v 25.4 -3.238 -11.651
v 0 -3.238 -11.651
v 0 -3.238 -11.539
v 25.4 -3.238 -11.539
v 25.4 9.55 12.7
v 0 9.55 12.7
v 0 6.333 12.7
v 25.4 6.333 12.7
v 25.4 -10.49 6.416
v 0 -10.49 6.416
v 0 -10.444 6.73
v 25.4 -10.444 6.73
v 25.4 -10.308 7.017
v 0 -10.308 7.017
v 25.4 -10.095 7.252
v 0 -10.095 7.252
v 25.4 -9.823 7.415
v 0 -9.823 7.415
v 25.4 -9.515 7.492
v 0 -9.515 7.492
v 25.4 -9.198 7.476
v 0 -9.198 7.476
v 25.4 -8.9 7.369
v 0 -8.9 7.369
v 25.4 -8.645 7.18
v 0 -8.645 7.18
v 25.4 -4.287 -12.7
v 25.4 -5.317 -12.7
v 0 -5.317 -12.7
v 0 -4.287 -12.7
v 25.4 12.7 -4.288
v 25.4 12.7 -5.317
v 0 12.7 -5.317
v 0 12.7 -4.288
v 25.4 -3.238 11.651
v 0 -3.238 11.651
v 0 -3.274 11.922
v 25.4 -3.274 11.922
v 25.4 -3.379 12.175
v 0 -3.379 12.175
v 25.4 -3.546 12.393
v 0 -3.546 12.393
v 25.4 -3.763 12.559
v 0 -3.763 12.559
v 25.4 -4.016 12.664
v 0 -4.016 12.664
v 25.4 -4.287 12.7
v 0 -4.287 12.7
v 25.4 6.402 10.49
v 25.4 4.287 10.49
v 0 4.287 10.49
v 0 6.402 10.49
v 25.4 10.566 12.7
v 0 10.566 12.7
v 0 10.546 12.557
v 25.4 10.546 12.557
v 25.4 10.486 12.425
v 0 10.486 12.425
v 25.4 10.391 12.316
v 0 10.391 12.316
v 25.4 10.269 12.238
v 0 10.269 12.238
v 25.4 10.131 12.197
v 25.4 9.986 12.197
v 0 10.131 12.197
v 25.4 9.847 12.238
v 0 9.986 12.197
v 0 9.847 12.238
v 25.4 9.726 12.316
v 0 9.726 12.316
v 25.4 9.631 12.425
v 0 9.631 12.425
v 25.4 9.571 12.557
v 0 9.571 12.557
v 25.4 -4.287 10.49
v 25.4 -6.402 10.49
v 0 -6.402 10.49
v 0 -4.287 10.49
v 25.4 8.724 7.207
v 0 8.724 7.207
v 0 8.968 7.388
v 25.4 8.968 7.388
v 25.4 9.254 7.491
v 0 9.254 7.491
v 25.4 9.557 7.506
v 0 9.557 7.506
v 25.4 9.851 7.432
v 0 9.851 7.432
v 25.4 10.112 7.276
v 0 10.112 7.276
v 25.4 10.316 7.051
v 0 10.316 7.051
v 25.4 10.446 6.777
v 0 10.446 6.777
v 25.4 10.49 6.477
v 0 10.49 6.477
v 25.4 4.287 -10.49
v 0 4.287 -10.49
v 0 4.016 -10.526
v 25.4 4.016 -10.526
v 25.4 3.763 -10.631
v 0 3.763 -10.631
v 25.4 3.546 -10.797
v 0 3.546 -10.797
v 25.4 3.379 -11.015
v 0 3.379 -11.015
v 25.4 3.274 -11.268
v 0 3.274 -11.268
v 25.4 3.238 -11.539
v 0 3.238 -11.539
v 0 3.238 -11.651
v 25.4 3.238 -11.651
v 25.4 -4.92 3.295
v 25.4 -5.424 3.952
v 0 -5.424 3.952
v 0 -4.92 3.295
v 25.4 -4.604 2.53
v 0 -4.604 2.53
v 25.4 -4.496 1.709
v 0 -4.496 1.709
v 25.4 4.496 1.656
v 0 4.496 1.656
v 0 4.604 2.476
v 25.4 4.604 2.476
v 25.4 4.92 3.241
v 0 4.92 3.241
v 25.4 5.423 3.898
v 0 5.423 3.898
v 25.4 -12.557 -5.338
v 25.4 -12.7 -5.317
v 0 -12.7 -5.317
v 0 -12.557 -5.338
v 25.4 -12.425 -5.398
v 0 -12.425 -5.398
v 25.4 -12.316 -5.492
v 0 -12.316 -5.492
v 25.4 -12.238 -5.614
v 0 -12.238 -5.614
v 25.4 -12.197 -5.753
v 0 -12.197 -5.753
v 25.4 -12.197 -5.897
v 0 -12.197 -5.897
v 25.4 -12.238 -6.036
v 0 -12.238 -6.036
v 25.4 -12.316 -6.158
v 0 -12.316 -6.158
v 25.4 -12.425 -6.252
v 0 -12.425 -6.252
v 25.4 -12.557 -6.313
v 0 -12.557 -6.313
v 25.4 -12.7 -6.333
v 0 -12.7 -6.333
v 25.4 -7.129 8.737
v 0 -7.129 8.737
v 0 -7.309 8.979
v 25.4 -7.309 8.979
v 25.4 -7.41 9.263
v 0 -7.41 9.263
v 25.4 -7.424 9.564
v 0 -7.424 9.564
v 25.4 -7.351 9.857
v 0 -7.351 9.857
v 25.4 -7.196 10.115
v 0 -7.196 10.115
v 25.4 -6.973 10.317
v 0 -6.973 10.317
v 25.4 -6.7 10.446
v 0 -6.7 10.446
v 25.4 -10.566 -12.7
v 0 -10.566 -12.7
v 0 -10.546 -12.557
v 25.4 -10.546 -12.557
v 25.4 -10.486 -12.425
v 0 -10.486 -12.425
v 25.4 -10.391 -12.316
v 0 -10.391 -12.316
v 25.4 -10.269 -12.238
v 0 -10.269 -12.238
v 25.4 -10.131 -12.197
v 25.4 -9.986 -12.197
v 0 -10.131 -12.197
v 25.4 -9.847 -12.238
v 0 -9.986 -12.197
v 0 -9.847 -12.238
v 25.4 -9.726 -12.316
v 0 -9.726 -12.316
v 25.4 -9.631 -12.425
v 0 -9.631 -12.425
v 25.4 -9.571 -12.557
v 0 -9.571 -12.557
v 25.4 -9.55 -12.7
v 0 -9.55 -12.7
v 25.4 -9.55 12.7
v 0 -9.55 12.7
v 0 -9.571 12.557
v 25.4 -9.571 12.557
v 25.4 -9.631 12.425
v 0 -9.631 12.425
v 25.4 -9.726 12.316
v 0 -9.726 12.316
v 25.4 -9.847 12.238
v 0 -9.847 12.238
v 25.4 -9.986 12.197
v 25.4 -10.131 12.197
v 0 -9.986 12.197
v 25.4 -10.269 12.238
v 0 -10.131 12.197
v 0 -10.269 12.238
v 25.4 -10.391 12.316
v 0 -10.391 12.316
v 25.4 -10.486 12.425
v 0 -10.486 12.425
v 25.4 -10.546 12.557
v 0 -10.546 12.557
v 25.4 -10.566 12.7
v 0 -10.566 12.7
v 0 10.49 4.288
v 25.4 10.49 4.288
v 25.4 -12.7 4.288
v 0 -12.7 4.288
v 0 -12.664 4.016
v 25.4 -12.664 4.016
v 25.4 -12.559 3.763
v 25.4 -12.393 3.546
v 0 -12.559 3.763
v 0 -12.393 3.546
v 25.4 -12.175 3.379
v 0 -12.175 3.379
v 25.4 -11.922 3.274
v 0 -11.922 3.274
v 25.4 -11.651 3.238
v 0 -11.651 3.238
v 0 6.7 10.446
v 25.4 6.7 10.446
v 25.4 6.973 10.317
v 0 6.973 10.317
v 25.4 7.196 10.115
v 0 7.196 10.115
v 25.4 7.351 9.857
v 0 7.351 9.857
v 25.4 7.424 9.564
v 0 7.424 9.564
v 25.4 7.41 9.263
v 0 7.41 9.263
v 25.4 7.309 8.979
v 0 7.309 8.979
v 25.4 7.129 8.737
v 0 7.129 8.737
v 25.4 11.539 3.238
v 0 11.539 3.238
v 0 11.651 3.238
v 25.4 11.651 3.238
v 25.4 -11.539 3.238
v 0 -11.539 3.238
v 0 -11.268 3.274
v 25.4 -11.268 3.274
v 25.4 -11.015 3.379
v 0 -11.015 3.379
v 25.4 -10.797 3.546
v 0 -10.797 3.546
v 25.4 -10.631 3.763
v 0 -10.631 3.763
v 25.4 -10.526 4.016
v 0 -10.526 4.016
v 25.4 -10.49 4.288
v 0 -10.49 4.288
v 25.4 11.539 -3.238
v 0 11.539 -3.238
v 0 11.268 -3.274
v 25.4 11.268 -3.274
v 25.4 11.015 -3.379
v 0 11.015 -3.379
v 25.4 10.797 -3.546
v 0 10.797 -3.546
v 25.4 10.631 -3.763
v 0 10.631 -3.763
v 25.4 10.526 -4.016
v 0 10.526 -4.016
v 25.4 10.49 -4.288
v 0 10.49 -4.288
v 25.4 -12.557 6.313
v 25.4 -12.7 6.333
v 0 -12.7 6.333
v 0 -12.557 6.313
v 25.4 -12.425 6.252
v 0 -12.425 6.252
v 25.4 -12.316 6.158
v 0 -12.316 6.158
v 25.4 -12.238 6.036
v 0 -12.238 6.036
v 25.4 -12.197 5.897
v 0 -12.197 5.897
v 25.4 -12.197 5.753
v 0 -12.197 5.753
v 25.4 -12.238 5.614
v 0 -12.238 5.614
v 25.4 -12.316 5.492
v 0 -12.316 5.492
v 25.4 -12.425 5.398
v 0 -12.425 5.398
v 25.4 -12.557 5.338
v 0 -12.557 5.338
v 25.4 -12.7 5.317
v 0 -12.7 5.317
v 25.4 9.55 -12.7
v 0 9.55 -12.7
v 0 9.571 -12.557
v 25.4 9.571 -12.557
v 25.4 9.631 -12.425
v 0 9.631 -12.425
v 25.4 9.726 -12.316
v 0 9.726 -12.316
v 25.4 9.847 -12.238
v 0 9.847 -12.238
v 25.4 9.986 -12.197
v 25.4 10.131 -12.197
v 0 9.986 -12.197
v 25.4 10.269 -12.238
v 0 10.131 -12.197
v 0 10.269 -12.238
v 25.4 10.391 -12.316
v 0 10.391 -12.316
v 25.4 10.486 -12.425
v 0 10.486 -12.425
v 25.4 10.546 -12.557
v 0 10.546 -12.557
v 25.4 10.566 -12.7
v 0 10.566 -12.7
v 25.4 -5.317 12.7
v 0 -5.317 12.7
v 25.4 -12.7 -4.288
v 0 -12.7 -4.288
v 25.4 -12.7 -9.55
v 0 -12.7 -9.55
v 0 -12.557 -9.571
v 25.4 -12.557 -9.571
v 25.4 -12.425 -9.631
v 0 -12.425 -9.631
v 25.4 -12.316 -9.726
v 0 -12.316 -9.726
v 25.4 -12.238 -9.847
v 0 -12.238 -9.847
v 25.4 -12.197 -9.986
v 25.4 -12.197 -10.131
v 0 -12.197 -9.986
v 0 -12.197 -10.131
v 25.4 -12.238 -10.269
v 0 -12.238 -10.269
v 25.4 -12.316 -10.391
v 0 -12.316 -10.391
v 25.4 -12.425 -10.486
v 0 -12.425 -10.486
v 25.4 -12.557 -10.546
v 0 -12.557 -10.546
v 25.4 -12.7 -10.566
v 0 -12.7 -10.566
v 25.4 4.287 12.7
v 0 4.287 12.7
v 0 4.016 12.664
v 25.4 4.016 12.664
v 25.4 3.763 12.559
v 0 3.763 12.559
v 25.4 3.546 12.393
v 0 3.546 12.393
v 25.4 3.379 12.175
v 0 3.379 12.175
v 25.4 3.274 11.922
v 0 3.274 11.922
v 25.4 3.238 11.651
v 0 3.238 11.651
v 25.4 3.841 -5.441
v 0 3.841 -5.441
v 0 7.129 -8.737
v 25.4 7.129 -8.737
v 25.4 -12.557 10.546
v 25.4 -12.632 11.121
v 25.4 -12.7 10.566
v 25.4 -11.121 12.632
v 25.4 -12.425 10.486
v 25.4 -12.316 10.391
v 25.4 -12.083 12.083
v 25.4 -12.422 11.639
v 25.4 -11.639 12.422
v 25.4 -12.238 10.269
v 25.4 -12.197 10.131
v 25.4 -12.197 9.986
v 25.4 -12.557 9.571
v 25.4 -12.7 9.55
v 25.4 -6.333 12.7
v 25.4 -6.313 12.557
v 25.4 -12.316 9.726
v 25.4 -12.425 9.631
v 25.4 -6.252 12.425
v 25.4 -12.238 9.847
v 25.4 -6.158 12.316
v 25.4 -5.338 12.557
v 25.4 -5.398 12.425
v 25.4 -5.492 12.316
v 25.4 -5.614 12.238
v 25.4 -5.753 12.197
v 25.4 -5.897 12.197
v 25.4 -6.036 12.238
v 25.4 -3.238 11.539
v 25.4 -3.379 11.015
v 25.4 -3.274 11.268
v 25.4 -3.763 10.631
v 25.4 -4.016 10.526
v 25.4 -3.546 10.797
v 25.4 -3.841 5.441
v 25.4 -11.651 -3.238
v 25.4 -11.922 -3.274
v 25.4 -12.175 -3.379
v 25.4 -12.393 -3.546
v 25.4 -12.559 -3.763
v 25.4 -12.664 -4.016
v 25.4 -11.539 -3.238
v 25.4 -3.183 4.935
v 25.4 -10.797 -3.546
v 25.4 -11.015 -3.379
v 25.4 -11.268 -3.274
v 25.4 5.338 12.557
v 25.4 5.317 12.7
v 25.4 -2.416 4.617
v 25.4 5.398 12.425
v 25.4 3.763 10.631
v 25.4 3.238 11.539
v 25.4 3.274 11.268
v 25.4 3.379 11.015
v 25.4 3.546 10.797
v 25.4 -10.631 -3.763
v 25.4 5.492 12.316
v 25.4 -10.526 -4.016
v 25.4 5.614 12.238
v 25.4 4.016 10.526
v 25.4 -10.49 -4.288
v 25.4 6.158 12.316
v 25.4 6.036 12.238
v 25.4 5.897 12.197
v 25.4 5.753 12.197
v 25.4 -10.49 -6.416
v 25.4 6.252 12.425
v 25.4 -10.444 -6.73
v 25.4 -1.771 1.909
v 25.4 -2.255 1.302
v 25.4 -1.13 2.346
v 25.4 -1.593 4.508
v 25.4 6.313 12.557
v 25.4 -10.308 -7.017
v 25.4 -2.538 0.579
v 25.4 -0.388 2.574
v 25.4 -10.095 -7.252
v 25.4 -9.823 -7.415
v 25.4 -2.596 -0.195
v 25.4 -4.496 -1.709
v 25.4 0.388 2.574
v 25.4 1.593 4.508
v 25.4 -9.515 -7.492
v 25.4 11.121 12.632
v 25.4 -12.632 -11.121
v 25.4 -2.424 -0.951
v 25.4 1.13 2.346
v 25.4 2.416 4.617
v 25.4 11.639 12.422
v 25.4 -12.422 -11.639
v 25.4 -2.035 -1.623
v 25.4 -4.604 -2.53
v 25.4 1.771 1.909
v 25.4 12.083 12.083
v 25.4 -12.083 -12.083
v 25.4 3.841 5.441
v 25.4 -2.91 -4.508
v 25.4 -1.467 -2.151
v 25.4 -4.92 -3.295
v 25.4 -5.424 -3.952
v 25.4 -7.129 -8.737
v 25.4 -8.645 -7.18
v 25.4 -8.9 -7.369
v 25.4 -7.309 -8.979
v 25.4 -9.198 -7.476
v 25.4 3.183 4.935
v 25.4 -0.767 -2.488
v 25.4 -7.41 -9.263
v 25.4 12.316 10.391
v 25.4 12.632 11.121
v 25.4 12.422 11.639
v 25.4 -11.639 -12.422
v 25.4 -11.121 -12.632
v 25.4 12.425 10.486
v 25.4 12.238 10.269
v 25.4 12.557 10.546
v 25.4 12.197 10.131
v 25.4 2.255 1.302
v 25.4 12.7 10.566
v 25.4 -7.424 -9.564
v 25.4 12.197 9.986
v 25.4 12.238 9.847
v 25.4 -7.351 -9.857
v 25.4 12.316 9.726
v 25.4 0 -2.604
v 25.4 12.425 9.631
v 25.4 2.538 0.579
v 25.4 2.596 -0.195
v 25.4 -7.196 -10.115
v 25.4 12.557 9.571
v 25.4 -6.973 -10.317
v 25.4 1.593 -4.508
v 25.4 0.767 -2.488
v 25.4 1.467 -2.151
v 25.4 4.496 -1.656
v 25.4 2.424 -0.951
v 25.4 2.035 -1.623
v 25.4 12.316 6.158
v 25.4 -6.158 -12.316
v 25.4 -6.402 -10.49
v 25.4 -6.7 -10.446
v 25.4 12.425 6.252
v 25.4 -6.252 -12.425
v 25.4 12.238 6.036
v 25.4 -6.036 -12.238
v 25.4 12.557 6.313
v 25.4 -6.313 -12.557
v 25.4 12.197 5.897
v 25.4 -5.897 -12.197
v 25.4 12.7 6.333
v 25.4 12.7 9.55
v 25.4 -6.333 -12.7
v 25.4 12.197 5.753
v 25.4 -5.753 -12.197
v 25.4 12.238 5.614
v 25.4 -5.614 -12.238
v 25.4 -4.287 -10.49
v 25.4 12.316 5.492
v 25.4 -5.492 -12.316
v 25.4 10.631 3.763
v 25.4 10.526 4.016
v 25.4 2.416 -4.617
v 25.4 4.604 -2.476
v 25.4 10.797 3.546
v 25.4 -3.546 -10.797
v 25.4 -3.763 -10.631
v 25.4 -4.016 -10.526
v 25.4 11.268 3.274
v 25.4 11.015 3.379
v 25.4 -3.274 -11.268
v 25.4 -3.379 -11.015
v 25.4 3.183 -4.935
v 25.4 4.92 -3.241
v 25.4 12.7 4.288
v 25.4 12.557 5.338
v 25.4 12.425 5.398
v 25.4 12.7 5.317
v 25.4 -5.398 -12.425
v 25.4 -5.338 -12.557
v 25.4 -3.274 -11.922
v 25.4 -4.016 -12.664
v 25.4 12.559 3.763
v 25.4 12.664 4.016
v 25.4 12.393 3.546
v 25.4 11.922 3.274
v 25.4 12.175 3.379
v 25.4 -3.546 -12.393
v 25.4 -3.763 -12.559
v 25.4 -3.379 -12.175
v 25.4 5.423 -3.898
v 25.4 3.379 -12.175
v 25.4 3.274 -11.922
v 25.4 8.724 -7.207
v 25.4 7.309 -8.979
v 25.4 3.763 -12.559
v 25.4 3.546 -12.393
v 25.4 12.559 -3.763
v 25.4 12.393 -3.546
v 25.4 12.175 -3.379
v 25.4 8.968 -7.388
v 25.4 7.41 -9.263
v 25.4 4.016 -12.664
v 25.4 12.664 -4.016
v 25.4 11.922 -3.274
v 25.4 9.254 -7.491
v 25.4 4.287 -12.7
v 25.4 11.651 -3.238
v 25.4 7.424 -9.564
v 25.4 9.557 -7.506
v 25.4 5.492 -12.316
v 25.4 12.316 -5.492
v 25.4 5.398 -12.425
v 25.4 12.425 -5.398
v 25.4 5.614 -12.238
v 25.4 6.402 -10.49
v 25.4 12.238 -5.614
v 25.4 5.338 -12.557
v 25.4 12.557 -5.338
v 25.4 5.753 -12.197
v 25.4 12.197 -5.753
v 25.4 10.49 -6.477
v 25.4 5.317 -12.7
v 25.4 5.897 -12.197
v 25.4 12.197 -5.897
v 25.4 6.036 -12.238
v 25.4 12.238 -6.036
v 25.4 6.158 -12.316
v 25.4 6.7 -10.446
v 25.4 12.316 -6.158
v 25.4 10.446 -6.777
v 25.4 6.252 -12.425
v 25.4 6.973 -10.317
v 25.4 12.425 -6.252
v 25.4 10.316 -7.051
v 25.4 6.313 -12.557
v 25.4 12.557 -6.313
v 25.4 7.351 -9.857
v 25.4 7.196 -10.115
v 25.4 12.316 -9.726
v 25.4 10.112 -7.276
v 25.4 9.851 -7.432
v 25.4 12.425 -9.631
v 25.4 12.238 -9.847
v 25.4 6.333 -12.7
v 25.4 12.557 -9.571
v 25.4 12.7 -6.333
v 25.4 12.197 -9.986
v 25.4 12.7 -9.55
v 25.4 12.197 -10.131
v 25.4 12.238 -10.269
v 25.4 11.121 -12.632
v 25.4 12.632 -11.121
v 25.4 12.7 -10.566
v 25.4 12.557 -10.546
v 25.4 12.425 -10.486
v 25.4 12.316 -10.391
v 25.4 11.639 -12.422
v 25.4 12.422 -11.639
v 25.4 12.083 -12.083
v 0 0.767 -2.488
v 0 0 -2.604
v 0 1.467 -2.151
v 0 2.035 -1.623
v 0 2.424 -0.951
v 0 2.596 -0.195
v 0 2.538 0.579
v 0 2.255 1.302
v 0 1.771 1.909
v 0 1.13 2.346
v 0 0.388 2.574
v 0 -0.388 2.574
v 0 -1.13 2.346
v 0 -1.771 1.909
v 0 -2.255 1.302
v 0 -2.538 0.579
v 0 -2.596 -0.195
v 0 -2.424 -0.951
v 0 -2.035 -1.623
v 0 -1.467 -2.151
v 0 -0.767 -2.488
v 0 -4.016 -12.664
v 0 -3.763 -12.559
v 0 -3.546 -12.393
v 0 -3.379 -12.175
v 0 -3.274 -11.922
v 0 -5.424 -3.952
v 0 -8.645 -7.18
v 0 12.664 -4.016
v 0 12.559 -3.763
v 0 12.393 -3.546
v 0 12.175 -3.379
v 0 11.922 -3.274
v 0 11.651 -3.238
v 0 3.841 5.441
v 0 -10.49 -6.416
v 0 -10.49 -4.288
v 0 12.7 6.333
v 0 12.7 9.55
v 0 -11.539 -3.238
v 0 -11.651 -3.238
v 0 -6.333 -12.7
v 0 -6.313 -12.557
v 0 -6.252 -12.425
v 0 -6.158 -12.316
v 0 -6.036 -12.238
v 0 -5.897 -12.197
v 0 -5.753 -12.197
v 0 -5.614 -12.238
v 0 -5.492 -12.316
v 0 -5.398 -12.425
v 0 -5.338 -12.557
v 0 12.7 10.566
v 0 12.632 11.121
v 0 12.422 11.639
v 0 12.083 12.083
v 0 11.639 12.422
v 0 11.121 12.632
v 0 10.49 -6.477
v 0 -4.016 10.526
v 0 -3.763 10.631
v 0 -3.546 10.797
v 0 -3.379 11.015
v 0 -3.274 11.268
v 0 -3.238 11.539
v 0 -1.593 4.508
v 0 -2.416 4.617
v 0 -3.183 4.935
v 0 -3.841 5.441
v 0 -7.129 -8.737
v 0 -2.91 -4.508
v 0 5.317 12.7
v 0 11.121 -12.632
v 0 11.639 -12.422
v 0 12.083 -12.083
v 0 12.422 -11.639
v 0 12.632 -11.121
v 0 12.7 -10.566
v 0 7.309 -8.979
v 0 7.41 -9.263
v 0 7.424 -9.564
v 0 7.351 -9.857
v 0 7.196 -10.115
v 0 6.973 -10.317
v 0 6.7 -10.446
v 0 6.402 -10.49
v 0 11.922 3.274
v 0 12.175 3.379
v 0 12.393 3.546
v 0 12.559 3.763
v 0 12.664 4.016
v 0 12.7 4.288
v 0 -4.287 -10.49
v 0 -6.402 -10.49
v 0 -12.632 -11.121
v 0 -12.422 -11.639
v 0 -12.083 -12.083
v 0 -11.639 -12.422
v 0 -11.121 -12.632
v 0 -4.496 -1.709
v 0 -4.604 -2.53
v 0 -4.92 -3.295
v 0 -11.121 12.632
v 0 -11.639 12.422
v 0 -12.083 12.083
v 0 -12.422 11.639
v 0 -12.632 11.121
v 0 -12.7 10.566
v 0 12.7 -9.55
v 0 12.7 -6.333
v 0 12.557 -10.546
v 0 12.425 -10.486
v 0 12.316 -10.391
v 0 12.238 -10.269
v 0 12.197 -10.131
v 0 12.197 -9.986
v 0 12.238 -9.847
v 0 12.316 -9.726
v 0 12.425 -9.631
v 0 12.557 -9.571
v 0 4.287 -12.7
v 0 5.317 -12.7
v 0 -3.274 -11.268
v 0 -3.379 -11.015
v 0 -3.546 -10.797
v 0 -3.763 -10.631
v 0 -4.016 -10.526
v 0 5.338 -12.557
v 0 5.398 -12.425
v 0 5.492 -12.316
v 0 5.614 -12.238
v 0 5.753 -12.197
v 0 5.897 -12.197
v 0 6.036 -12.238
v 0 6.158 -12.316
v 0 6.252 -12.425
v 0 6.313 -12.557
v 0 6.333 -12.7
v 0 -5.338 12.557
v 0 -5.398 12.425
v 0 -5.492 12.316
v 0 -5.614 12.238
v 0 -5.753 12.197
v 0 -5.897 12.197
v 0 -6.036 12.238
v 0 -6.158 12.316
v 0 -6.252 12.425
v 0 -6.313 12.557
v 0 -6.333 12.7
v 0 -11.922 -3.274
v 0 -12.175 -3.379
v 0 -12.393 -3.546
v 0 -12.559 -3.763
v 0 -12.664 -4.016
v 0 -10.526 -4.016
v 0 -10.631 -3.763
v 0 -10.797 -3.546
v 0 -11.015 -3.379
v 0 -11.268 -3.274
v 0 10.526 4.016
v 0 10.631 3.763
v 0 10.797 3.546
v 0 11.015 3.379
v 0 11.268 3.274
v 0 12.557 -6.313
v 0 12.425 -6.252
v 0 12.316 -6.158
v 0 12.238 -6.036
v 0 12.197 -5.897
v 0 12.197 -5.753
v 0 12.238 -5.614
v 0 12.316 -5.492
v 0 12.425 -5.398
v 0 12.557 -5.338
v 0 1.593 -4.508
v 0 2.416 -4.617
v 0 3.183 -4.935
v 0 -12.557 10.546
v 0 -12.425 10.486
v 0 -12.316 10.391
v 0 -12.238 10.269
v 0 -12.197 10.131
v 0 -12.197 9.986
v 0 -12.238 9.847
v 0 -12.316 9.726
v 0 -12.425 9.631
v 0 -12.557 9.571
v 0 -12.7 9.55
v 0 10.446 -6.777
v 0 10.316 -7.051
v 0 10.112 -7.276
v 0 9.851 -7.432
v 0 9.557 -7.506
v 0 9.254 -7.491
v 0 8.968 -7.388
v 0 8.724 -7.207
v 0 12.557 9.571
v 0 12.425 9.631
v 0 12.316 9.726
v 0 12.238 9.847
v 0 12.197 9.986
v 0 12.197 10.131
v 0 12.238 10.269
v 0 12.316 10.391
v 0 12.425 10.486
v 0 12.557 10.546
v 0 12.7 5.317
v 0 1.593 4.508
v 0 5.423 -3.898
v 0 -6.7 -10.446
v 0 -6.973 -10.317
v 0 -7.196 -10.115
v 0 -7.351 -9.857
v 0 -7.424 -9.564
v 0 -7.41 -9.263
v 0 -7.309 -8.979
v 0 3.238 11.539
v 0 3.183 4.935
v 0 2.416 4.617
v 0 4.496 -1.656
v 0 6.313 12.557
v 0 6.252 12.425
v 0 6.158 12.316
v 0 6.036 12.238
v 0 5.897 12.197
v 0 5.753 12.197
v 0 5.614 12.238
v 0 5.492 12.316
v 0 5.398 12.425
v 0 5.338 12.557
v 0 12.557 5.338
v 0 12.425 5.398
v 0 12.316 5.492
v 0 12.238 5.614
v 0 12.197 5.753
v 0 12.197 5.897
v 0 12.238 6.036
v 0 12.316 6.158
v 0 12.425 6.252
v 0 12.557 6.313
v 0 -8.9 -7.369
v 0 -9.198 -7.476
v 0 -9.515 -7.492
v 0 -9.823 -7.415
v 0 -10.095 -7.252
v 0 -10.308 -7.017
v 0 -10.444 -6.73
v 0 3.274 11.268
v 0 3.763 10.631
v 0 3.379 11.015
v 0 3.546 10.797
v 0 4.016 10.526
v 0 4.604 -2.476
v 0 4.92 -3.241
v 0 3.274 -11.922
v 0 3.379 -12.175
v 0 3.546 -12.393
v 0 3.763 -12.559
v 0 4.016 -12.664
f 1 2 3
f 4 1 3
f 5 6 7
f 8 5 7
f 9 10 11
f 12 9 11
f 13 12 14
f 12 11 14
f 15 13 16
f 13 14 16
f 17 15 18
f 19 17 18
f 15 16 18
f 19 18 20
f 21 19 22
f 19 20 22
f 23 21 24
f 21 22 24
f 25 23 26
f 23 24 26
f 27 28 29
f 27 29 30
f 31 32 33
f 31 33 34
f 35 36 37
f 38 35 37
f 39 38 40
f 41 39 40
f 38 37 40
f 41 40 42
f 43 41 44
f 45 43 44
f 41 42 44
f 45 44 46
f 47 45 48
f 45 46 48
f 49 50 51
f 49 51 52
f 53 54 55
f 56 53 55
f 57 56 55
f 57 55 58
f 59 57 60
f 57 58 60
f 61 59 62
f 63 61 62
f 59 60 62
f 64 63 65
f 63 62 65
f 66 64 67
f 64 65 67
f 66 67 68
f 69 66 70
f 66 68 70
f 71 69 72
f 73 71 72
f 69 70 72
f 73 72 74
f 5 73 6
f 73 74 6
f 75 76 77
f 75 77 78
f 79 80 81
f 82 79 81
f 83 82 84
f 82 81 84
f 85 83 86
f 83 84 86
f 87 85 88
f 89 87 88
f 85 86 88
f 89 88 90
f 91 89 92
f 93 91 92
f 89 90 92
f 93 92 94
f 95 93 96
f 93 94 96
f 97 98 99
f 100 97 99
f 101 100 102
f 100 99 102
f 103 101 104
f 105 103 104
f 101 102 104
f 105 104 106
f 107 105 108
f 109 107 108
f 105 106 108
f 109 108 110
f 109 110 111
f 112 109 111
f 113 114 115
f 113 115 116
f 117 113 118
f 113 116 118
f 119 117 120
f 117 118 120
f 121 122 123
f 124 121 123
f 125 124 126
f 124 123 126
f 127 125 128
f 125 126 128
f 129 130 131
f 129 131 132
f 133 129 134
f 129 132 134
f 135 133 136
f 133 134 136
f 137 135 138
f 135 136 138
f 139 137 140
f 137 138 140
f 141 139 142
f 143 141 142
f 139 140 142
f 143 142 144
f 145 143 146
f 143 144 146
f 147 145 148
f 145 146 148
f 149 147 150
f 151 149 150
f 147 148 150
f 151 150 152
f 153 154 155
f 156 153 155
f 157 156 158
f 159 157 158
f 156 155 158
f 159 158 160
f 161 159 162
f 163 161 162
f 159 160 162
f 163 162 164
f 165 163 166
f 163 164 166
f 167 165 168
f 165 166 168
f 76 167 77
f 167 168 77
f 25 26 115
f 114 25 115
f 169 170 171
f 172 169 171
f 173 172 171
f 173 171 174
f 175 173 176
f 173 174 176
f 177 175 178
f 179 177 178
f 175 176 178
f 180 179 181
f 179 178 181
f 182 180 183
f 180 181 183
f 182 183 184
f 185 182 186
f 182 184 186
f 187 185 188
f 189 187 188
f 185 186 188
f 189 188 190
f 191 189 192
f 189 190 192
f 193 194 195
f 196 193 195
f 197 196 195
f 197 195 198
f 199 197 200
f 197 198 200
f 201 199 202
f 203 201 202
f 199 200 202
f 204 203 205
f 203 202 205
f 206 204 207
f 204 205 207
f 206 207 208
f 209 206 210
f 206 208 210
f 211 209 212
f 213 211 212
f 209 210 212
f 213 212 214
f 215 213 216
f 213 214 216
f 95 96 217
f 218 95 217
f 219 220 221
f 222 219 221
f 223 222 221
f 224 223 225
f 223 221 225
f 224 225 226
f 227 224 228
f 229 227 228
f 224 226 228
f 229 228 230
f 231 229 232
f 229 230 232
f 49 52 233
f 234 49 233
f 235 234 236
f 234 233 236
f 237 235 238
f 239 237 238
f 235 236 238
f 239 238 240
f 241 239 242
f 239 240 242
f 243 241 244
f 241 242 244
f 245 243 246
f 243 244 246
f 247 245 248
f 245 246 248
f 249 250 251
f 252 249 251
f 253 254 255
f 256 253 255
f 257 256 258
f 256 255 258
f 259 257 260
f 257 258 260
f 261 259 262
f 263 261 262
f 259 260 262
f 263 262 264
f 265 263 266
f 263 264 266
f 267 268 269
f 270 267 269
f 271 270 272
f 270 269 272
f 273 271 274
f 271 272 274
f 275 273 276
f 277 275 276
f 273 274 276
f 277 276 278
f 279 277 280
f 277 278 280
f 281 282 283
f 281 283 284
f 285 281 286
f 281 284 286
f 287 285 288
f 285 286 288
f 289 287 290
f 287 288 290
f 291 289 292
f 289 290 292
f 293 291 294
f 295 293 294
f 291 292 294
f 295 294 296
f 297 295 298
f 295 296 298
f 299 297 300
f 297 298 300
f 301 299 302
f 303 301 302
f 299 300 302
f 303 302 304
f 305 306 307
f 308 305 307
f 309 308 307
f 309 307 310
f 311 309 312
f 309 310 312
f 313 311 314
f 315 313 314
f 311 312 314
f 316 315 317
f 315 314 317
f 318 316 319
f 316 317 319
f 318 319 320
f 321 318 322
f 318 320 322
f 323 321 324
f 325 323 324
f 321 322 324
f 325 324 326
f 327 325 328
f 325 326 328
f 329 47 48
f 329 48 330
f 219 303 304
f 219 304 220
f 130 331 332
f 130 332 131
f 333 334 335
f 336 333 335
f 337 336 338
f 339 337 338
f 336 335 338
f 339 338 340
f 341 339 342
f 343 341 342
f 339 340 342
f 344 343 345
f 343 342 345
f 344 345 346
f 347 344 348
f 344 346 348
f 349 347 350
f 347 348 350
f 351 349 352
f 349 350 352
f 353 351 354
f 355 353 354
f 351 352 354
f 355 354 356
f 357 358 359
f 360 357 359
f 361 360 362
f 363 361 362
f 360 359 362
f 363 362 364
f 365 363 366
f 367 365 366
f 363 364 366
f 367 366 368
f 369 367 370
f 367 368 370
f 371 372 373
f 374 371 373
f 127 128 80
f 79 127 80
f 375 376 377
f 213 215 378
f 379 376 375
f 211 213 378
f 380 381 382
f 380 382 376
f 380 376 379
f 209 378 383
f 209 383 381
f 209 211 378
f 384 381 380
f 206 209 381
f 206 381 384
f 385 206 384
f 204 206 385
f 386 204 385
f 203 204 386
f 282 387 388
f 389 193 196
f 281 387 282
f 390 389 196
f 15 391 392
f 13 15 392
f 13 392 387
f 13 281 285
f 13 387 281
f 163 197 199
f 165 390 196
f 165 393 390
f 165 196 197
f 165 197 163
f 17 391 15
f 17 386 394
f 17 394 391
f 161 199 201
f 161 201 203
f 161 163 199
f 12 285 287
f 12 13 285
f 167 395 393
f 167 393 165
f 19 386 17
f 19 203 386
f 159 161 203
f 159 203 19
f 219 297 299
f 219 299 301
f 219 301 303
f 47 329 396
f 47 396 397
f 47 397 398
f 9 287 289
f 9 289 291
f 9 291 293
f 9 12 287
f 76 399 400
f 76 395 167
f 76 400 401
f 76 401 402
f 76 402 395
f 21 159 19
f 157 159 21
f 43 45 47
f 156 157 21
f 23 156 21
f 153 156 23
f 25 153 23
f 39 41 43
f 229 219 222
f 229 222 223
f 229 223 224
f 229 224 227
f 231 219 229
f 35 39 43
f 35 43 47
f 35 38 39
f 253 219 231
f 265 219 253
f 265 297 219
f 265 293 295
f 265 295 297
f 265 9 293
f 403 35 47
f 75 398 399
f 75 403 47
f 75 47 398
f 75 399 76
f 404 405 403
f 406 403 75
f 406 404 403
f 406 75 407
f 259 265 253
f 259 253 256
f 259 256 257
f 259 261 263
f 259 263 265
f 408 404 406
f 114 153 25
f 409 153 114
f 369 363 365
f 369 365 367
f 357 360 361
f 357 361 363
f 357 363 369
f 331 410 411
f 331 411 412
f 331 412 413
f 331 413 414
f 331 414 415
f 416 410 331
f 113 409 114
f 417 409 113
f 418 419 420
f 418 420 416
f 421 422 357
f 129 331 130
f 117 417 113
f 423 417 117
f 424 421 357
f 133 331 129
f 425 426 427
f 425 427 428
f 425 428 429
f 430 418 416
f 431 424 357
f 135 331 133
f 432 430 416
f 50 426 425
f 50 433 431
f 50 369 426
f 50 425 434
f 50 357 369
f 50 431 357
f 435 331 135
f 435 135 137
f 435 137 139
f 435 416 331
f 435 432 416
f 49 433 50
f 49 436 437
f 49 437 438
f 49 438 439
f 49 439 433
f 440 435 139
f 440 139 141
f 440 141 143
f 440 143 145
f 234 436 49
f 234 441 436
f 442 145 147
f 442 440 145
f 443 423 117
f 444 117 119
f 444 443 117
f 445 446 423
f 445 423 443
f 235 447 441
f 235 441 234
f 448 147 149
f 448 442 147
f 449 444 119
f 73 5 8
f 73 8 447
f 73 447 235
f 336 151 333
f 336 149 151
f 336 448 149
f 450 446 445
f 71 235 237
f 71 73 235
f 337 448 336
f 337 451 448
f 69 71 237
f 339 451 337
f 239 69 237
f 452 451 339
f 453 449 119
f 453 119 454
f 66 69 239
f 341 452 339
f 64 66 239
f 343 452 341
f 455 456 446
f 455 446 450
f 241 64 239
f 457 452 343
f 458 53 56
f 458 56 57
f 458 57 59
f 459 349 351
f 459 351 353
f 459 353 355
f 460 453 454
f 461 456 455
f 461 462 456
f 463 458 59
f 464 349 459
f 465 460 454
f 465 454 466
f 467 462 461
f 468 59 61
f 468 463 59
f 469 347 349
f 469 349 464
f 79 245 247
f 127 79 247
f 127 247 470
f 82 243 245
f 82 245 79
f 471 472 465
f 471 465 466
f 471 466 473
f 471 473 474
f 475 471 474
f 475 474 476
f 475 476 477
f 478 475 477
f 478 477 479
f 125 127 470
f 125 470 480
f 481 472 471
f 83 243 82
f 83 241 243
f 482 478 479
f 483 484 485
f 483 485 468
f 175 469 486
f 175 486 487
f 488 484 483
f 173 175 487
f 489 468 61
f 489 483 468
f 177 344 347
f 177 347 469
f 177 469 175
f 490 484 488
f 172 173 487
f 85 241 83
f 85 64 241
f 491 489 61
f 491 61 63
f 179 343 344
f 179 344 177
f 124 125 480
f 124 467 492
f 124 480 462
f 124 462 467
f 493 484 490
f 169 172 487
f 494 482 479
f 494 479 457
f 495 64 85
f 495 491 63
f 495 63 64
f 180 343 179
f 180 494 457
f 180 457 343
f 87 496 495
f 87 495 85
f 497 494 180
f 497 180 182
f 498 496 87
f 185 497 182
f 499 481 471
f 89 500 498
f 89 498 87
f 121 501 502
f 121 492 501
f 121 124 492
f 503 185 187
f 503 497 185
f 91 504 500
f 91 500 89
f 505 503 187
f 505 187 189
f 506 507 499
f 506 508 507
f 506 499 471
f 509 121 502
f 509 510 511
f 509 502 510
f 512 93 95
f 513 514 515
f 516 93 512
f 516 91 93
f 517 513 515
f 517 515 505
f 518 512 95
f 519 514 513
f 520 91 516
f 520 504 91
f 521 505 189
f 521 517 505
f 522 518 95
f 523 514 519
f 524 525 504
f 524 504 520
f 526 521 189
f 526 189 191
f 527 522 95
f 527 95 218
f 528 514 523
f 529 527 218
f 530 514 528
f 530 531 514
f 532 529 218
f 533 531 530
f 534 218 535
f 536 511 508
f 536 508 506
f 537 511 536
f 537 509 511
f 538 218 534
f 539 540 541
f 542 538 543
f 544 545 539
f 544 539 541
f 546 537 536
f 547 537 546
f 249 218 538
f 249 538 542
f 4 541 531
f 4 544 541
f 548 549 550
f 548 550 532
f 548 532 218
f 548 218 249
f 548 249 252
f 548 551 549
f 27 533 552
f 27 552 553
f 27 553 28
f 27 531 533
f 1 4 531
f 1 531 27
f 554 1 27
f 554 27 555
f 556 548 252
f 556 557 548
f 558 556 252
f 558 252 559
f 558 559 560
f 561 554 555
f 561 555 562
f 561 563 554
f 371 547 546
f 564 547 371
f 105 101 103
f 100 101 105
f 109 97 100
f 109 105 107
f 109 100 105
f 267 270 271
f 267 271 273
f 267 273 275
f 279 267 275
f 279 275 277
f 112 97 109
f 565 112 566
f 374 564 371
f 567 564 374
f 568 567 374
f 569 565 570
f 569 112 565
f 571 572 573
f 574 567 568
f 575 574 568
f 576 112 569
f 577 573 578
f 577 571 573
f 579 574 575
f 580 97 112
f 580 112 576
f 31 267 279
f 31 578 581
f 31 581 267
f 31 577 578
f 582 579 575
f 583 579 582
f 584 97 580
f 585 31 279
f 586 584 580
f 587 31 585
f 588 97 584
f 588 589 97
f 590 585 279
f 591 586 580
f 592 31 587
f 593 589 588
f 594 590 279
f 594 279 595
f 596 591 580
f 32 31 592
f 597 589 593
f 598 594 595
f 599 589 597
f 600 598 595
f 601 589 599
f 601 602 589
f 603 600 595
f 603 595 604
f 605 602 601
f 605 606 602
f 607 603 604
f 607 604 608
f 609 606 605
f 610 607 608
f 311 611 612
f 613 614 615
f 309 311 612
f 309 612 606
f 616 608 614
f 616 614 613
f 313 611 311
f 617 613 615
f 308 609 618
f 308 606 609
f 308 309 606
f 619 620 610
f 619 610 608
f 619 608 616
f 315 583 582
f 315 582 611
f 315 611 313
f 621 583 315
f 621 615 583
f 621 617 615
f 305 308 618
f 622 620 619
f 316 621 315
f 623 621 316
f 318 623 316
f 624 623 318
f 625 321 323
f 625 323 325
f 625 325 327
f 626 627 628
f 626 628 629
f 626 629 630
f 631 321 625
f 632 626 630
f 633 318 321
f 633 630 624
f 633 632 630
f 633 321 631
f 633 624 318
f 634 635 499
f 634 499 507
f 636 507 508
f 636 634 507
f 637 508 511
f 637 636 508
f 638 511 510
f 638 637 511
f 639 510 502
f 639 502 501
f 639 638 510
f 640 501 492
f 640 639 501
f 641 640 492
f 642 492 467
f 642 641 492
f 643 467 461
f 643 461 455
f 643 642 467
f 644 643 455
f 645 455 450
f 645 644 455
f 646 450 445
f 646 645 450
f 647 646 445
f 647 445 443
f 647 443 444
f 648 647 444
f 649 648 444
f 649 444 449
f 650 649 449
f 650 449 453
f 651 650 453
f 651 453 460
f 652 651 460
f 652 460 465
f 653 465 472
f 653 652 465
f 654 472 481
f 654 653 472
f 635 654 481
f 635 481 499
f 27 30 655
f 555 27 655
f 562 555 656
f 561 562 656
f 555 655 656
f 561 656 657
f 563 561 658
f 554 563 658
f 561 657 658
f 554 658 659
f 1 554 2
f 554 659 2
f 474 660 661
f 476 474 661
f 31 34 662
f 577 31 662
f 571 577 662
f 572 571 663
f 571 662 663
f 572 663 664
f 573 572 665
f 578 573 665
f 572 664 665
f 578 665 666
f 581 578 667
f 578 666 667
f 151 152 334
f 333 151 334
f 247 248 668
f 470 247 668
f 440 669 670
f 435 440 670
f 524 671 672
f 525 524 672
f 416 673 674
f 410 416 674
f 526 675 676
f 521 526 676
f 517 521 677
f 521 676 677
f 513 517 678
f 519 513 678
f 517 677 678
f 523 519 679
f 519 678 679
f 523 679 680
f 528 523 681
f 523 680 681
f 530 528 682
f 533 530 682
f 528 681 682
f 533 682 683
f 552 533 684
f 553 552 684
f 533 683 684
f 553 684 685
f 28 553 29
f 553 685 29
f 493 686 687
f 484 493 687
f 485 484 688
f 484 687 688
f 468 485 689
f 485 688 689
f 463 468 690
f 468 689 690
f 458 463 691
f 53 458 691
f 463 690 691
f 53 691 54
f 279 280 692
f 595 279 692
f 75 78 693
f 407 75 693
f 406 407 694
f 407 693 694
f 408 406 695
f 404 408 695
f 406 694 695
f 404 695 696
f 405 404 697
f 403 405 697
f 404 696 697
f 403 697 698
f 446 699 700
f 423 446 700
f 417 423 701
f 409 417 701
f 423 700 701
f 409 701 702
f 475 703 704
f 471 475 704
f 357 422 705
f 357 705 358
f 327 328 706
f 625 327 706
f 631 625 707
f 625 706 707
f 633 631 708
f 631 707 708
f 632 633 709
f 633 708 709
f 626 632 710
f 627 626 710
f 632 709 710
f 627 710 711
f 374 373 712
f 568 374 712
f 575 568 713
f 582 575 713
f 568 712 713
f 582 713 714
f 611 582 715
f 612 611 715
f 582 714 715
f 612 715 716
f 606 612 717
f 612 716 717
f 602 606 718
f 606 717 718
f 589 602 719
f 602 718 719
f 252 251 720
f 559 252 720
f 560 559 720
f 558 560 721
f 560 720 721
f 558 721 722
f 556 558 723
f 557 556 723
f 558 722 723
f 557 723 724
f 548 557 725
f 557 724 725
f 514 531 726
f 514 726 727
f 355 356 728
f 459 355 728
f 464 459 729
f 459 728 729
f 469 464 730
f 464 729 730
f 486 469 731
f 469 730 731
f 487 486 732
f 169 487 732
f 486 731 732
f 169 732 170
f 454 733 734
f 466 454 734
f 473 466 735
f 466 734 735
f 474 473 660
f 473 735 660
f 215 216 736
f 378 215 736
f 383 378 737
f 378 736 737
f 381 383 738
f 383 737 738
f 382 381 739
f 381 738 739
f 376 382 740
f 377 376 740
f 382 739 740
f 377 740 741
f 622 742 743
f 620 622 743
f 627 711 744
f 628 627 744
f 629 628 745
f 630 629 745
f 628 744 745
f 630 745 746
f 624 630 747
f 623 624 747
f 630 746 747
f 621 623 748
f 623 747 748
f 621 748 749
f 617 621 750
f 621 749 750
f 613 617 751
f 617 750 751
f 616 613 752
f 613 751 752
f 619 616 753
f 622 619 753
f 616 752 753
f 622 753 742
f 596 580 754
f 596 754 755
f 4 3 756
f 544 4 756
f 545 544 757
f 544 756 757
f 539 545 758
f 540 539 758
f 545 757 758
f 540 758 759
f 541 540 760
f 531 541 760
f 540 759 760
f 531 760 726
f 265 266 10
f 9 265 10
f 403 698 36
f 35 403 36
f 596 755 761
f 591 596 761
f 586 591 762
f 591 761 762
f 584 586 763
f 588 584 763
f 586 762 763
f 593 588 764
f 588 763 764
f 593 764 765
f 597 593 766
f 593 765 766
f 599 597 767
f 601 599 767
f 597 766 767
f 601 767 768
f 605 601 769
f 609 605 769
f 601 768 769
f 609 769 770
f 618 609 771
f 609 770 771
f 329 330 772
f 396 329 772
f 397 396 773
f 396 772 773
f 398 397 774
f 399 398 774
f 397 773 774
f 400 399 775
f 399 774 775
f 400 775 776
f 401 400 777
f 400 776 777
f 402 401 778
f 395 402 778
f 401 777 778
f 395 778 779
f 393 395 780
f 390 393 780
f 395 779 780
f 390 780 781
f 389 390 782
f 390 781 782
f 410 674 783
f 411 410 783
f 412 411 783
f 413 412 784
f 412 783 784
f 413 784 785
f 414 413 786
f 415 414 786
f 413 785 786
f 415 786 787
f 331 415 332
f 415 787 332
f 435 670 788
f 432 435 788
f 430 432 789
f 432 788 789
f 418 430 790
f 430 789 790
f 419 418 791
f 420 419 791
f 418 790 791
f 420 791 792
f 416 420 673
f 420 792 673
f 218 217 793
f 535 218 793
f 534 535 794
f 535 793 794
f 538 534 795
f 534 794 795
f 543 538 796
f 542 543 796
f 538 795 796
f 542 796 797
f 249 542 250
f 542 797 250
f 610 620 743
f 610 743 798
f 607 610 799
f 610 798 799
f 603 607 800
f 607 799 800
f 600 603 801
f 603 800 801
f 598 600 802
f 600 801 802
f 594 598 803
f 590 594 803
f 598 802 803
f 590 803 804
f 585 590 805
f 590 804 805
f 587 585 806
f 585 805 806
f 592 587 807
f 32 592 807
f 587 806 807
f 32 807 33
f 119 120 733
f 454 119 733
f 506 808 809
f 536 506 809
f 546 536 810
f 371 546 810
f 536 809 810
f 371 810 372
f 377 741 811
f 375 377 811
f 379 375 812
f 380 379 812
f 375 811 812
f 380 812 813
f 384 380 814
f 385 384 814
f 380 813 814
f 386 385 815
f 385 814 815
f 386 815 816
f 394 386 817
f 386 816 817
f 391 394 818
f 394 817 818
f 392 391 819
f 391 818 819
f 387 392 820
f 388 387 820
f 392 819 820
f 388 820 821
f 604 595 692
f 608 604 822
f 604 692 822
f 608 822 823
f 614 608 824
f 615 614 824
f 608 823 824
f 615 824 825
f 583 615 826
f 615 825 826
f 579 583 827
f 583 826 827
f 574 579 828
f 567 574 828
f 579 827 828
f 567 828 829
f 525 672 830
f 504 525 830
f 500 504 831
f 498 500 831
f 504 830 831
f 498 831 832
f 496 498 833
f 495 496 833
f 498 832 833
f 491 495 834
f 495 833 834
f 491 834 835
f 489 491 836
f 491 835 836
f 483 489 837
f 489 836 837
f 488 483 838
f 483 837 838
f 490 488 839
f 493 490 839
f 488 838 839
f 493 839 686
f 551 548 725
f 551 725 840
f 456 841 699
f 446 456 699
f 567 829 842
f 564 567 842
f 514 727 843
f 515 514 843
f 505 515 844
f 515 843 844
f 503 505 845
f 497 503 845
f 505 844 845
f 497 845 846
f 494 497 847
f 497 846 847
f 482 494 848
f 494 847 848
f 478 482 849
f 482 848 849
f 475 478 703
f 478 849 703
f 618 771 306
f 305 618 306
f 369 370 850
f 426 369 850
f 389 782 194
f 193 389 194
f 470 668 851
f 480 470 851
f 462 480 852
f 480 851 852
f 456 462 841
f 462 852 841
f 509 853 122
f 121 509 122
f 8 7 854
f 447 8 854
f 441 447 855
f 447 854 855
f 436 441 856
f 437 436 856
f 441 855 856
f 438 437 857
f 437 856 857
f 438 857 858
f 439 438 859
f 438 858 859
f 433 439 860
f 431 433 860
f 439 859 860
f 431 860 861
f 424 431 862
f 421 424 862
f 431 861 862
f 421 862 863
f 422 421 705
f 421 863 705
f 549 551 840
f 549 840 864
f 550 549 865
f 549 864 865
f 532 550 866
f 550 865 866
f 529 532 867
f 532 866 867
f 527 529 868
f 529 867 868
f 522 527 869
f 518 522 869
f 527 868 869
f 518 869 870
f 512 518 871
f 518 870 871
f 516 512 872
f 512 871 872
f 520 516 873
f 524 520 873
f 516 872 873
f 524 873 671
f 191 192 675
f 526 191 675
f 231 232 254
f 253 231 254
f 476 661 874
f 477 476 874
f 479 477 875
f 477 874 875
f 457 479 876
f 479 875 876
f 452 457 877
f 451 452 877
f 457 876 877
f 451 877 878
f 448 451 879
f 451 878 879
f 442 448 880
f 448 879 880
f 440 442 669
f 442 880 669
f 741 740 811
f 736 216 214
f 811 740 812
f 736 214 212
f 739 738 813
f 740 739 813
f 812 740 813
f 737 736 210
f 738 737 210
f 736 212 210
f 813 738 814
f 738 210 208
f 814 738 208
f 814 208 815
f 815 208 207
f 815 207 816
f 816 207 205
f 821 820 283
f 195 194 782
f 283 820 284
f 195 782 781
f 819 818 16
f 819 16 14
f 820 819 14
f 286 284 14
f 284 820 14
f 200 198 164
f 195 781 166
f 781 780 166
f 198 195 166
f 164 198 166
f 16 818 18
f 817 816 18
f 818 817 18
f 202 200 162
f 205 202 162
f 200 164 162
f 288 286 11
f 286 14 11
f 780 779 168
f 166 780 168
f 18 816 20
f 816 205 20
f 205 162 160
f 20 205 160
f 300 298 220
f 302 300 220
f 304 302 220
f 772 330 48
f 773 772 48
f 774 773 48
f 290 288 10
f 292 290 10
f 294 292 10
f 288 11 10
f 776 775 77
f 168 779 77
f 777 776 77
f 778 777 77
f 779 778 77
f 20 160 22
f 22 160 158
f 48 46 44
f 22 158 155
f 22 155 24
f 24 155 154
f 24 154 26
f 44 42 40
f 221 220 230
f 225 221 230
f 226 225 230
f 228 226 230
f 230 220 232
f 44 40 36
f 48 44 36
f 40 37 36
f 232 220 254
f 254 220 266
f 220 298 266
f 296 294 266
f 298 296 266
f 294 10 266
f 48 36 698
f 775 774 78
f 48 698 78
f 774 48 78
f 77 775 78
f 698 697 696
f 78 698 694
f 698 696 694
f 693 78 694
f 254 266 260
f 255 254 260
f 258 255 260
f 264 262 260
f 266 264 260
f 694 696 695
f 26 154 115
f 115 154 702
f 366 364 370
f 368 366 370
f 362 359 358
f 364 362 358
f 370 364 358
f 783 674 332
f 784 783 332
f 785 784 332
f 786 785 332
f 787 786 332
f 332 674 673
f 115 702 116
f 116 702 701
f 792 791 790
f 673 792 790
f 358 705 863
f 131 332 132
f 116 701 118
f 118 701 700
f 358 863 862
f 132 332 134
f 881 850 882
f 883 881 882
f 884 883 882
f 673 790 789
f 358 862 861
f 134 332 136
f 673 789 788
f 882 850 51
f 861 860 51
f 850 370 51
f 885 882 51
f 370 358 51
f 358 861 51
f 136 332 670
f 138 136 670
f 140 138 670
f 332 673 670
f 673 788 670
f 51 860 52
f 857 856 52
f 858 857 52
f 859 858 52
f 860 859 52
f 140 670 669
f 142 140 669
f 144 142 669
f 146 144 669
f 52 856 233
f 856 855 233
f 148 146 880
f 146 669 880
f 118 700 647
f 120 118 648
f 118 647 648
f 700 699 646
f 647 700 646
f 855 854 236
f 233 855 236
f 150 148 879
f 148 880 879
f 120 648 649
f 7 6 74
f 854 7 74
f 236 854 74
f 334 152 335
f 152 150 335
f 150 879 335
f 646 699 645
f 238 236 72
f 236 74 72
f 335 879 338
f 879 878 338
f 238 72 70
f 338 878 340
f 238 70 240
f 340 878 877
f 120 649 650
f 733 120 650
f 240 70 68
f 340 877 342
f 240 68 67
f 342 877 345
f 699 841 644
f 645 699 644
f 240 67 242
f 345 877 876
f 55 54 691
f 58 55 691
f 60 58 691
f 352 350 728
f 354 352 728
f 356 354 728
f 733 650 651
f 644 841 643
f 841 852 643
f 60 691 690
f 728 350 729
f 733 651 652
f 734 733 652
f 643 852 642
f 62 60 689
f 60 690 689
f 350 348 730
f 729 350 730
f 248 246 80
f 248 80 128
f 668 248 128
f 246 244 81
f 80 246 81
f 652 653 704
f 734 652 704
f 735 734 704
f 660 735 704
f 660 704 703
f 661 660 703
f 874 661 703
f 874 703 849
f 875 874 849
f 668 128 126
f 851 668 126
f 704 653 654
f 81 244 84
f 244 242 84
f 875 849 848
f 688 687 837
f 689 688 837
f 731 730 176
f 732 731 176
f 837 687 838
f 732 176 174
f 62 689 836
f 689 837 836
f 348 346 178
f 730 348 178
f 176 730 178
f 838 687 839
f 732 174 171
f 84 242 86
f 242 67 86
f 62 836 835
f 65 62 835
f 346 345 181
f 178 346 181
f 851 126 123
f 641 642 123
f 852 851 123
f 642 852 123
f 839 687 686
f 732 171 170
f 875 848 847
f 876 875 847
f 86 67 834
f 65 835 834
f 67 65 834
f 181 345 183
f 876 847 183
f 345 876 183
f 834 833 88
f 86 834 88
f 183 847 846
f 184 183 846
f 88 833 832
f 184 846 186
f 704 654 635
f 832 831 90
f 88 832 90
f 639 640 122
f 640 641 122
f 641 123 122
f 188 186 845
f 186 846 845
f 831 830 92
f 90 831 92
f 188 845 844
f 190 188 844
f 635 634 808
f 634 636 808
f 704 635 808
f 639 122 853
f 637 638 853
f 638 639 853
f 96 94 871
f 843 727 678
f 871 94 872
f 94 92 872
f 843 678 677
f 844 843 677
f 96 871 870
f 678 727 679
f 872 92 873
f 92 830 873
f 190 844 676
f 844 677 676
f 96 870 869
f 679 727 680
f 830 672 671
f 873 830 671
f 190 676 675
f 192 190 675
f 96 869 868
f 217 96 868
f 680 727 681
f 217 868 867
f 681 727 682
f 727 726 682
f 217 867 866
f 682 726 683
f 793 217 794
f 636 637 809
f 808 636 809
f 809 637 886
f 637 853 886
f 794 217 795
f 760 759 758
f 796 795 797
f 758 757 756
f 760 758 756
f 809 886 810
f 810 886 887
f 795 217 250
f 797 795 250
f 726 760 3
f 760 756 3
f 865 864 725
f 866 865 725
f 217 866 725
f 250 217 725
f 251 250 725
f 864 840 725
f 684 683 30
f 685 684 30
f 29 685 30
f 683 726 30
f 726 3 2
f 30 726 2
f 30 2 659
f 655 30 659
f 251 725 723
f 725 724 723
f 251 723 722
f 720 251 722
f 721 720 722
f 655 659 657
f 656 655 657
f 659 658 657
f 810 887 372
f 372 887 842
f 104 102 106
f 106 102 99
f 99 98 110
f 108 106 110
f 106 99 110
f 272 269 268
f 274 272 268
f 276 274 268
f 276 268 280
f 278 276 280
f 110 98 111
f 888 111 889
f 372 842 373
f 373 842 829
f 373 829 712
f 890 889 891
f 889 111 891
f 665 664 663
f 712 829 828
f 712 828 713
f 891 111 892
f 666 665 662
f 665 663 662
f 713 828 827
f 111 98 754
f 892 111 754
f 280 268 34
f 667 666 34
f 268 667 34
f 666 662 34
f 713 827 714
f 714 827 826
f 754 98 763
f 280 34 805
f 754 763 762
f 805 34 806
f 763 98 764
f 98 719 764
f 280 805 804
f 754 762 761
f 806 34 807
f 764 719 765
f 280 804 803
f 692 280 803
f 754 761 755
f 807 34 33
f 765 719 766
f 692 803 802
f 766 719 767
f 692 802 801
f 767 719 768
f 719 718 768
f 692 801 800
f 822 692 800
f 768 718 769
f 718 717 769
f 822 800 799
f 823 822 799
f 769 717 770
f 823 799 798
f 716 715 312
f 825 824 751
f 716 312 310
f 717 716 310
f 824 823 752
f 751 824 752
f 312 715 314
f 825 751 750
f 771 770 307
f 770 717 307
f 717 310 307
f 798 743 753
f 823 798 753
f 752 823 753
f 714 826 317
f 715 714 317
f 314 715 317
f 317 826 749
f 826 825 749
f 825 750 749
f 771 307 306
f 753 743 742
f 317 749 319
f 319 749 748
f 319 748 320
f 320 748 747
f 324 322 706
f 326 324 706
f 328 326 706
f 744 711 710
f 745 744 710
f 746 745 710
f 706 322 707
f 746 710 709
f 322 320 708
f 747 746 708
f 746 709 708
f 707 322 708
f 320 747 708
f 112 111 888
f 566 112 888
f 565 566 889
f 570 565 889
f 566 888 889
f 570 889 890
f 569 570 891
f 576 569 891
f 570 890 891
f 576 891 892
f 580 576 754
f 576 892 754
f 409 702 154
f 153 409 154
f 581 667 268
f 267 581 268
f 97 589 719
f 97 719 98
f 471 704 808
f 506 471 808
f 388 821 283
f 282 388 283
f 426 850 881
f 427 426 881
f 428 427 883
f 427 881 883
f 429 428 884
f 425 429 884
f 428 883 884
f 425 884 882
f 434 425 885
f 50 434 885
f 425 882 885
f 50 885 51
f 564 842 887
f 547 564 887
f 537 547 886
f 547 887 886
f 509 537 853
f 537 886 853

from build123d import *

# Parameters (mm, degrees)
SKETCH1_R           = 2.6035
BOSS_EXTRUDE1_DEPTH = 25.4


with BuildPart() as part:
    # Sketch1 → Boss-Extrude1 (new body)
    with BuildSketch(Plane(origin=(0, 0, 0), x_dir=(0, 0, -1), z_dir=(1, 0, 0))):
        with BuildLine():
            Line((6.333126718, -12.7), (9.550443118, -12.7))
            ThreePointArc((9.550443118, -12.7), (10.058366869, -12.192000006), (10.566443095, -12.699847501))
            ThreePointArc((10.566443095, -12.699847501), (12.082537762, -12.08250727), (12.699846982, -10.566399977))
            ThreePointArc((12.699846982, -10.566399977), (12.192000006, -10.058323491), (12.7, -9.5504))
            Line((12.7, -9.5504), (12.7, -6.3330836))
            ThreePointArc((12.7, -6.3330836), (12.192, -5.8250836), (12.7, -5.3170836))
            Line((12.7, -5.3170836), (12.7, -4.287469289))
            ThreePointArc((12.7, -4.287469289), (12.39275138, -3.545705502), (11.650987593, -3.238456882))
            Line((11.650987593, -3.238456882), (11.539212407, -3.238456882))
            ThreePointArc((11.539212407, -3.238456882), (10.79744862, -3.545705502), (10.4902, -4.287469289))
            Line((10.4902, -4.287469289), (10.4902, -6.402089023))
            ThreePointArc((10.4902, -6.402089023), (9.856505071, -7.351067942), (8.737131347, -7.129408934))
            Line((8.737131347, -7.129408934), (4.5085, -2.9104418))
            Line((4.5085, -2.9104418), (4.5085, 1.593185507))
            ThreePointArc((4.5085, 1.593185507), (4.750877967, 2.809883091), (5.441005833, 3.840816462))
            Line((5.441005833, 3.840816462), (8.737131347, 7.129408934))
            ThreePointArc((8.737131347, 7.129408934), (9.856505071, 7.351067942), (10.4902, 6.402089023))
            Line((10.4902, 6.402089023), (10.4902, 4.287469289))
            ThreePointArc((10.4902, 4.287469289), (10.79744862, 3.545705502), (11.539212407, 3.238456882))
            Line((11.539212407, 3.238456882), (11.650987593, 3.238456882))
            ThreePointArc((11.650987593, 3.238456882), (12.39275138, 3.545705502), (12.7, 4.287469289))
            Line((12.7, 4.287469289), (12.7, 5.3170836))
            ThreePointArc((12.7, 5.3170836), (12.192, 5.8250836), (12.7, 6.3330836))
            Line((12.7, 6.3330836), (12.7, 9.5504))
            ThreePointArc((12.7, 9.5504), (12.192000006, 10.058323491), (12.699846982, 10.566399977))
            ThreePointArc((12.699846982, 10.566399977), (12.082537762, 12.08250727), (10.566443095, 12.699847501))
            ThreePointArc((10.566443095, 12.699847501), (10.058366869, 12.192000006), (9.550443118, 12.7))
            Line((9.550443118, 12.7), (6.333126718, 12.7))
            ThreePointArc((6.333126718, 12.7), (5.825126718, 12.192), (5.317126718, 12.7))
            Line((5.317126718, 12.7), (4.287512407, 12.7))
            ThreePointArc((4.287512407, 12.7), (3.54574862, 12.39275138), (3.2385, 11.650987593))
            Line((3.2385, 11.650987593), (3.2385, 11.539212407))
            ThreePointArc((3.2385, 11.539212407), (3.54574862, 10.79744862), (4.287512407, 10.4902))
            Line((4.287512407, 10.4902), (6.476788598, 10.4902))
            ThreePointArc((6.476788598, 10.4902), (7.432222385, 9.85140422), (7.207036008, 8.724370562))
            Line((7.207036008, 8.724370562), (3.898272566, 5.423169045))
            ThreePointArc((3.898272566, 5.423169045), (2.869120213, 4.736787962), (1.655778399, 4.4958))
            Line((1.655778399, 4.4958), (-1.655778399, 4.4958))
            ThreePointArc((-1.655778399, 4.4958), (-2.869120213, 4.736787962), (-3.898272566, 5.423169045))
            Line((-3.898272566, 5.423169045), (-7.207036008, 8.724370562))
            ThreePointArc((-7.207036008, 8.724370562), (-7.432222385, 9.85140422), (-6.476788598, 10.4902))
            Line((-6.476788598, 10.4902), (-4.287512407, 10.4902))
            ThreePointArc((-4.287512407, 10.4902), (-3.54574862, 10.79744862), (-3.2385, 11.539212407))
            Line((-3.2385, 11.539212407), (-3.2385, 11.650987593))
            ThreePointArc((-3.2385, 11.650987593), (-3.54574862, 12.39275138), (-4.287512407, 12.7))
            Line((-4.287512407, 12.7), (-5.317126718, 12.7))
            ThreePointArc((-5.317126718, 12.7), (-5.825126718, 12.192), (-6.333126718, 12.7))
            Line((-6.333126718, 12.7), (-9.550443118, 12.7))
            ThreePointArc((-9.550443118, 12.7), (-10.058366869, 12.192000006), (-10.566443095, 12.699847501))
            ThreePointArc((-10.566443095, 12.699847501), (-12.082537762, 12.08250727), (-12.699846982, 10.566399977))
            ThreePointArc((-12.699846982, 10.566399977), (-12.192000006, 10.058323491), (-12.7, 9.5504))
            Line((-12.7, 9.5504), (-12.7, 6.3330836))
            ThreePointArc((-12.7, 6.3330836), (-12.192, 5.8250836), (-12.7, 5.3170836))
            Line((-12.7, 5.3170836), (-12.7, 4.287469289))
            ThreePointArc((-12.7, 4.287469289), (-12.39275138, 3.545705502), (-11.650987593, 3.238456882))
            Line((-11.650987593, 3.238456882), (-11.539212407, 3.238456882))
            ThreePointArc((-11.539212407, 3.238456882), (-10.79744862, 3.545705502), (-10.4902, 4.287469289))
            Line((-10.4902, 4.287469289), (-10.4902, 6.402089023))
            ThreePointArc((-10.4902, 6.402089023), (-9.856505071, 7.351067942), (-8.737131347, 7.129408934))
            Line((-8.737131347, 7.129408934), (-5.441005833, 3.840816462))
            ThreePointArc((-5.441005833, 3.840816462), (-4.750877967, 2.809883091), (-4.5085, 1.593185507))
            Line((-4.5085, 1.593185507), (-4.5085, -1.593185507))
            ThreePointArc((-4.5085, -1.593185507), (-4.750877967, -2.809883091), (-5.441005833, -3.840816462))
            Line((-5.441005833, -3.840816462), (-8.737131347, -7.129408934))
            ThreePointArc((-8.737131347, -7.129408934), (-9.856505071, -7.351067942), (-10.4902, -6.402089023))
            Line((-10.4902, -6.402089023), (-10.4902, -4.287469289))
            ThreePointArc((-10.4902, -4.287469289), (-10.79744862, -3.545705502), (-11.539212407, -3.238456882))
            Line((-11.539212407, -3.238456882), (-11.650987593, -3.238456882))
            ThreePointArc((-11.650987593, -3.238456882), (-12.39275138, -3.545705502), (-12.7, -4.287469289))
            Line((-12.7, -4.287469289), (-12.7, -5.3170836))
            ThreePointArc((-12.7, -5.3170836), (-12.192, -5.8250836), (-12.7, -6.3330836))
            Line((-12.7, -6.3330836), (-12.7, -9.5504))
            ThreePointArc((-12.7, -9.5504), (-12.192000006, -10.058323491), (-12.699846982, -10.566399977))
            ThreePointArc((-12.699846982, -10.566399977), (-12.082537762, -12.08250727), (-10.566443095, -12.699847501))
            ThreePointArc((-10.566443095, -12.699847501), (-10.058366869, -12.192000006), (-9.550443118, -12.7))
            Line((-9.550443118, -12.7), (-6.333126718, -12.7))
            ThreePointArc((-6.333126718, -12.7), (-5.825126718, -12.192), (-5.317126718, -12.7))
            Line((-5.317126718, -12.7), (-4.287512407, -12.7))
            ThreePointArc((-4.287512407, -12.7), (-3.54574862, -12.39275138), (-3.2385, -11.650987593))
            Line((-3.2385, -11.650987593), (-3.2385, -11.539212407))
            ThreePointArc((-3.2385, -11.539212407), (-3.54574862, -10.79744862), (-4.287512407, -10.4902))
            Line((-4.287512407, -10.4902), (-6.416408329, -10.4902))
            ThreePointArc((-6.416408329, -10.4902), (-7.41473083, -9.822813117), (-7.179650497, -8.645192506))
            Line((-7.179650497, -8.645192506), (-3.952270251, -5.423690499))
            ThreePointArc((-3.952270251, -5.423690499), (-2.922936451, -4.736929036), (-1.709253557, -4.4958))
            Line((-1.709253557, -4.4958), (1.709253557, -4.4958))
            ThreePointArc((1.709253557, -4.4958), (2.922936451, -4.736929036), (3.952270251, -5.423690499))
            Line((3.952270251, -5.423690499), (7.179650497, -8.645192506))
            ThreePointArc((7.179650497, -8.645192506), (7.41473083, -9.822813117), (6.416408329, -10.4902))
            Line((6.416408329, -10.4902), (4.287512407, -10.4902))
            ThreePointArc((4.287512407, -10.4902), (3.54574862, -10.79744862), (3.2385, -11.539212407))
            Line((3.2385, -11.539212407), (3.2385, -11.650987593))
            ThreePointArc((3.2385, -11.650987593), (3.54574862, -12.39275138), (4.287512407, -12.7))
            Line((4.287512407, -12.7), (5.317126718, -12.7))
            ThreePointArc((5.317126718, -12.7), (5.825126718, -12.192), (6.333126718, -12.7))
        make_face()
        Circle(SKETCH1_R, mode=Mode.SUBTRACT)
    extrude(amount=BOSS_EXTRUDE1_DEPTH)


solid = part.part
